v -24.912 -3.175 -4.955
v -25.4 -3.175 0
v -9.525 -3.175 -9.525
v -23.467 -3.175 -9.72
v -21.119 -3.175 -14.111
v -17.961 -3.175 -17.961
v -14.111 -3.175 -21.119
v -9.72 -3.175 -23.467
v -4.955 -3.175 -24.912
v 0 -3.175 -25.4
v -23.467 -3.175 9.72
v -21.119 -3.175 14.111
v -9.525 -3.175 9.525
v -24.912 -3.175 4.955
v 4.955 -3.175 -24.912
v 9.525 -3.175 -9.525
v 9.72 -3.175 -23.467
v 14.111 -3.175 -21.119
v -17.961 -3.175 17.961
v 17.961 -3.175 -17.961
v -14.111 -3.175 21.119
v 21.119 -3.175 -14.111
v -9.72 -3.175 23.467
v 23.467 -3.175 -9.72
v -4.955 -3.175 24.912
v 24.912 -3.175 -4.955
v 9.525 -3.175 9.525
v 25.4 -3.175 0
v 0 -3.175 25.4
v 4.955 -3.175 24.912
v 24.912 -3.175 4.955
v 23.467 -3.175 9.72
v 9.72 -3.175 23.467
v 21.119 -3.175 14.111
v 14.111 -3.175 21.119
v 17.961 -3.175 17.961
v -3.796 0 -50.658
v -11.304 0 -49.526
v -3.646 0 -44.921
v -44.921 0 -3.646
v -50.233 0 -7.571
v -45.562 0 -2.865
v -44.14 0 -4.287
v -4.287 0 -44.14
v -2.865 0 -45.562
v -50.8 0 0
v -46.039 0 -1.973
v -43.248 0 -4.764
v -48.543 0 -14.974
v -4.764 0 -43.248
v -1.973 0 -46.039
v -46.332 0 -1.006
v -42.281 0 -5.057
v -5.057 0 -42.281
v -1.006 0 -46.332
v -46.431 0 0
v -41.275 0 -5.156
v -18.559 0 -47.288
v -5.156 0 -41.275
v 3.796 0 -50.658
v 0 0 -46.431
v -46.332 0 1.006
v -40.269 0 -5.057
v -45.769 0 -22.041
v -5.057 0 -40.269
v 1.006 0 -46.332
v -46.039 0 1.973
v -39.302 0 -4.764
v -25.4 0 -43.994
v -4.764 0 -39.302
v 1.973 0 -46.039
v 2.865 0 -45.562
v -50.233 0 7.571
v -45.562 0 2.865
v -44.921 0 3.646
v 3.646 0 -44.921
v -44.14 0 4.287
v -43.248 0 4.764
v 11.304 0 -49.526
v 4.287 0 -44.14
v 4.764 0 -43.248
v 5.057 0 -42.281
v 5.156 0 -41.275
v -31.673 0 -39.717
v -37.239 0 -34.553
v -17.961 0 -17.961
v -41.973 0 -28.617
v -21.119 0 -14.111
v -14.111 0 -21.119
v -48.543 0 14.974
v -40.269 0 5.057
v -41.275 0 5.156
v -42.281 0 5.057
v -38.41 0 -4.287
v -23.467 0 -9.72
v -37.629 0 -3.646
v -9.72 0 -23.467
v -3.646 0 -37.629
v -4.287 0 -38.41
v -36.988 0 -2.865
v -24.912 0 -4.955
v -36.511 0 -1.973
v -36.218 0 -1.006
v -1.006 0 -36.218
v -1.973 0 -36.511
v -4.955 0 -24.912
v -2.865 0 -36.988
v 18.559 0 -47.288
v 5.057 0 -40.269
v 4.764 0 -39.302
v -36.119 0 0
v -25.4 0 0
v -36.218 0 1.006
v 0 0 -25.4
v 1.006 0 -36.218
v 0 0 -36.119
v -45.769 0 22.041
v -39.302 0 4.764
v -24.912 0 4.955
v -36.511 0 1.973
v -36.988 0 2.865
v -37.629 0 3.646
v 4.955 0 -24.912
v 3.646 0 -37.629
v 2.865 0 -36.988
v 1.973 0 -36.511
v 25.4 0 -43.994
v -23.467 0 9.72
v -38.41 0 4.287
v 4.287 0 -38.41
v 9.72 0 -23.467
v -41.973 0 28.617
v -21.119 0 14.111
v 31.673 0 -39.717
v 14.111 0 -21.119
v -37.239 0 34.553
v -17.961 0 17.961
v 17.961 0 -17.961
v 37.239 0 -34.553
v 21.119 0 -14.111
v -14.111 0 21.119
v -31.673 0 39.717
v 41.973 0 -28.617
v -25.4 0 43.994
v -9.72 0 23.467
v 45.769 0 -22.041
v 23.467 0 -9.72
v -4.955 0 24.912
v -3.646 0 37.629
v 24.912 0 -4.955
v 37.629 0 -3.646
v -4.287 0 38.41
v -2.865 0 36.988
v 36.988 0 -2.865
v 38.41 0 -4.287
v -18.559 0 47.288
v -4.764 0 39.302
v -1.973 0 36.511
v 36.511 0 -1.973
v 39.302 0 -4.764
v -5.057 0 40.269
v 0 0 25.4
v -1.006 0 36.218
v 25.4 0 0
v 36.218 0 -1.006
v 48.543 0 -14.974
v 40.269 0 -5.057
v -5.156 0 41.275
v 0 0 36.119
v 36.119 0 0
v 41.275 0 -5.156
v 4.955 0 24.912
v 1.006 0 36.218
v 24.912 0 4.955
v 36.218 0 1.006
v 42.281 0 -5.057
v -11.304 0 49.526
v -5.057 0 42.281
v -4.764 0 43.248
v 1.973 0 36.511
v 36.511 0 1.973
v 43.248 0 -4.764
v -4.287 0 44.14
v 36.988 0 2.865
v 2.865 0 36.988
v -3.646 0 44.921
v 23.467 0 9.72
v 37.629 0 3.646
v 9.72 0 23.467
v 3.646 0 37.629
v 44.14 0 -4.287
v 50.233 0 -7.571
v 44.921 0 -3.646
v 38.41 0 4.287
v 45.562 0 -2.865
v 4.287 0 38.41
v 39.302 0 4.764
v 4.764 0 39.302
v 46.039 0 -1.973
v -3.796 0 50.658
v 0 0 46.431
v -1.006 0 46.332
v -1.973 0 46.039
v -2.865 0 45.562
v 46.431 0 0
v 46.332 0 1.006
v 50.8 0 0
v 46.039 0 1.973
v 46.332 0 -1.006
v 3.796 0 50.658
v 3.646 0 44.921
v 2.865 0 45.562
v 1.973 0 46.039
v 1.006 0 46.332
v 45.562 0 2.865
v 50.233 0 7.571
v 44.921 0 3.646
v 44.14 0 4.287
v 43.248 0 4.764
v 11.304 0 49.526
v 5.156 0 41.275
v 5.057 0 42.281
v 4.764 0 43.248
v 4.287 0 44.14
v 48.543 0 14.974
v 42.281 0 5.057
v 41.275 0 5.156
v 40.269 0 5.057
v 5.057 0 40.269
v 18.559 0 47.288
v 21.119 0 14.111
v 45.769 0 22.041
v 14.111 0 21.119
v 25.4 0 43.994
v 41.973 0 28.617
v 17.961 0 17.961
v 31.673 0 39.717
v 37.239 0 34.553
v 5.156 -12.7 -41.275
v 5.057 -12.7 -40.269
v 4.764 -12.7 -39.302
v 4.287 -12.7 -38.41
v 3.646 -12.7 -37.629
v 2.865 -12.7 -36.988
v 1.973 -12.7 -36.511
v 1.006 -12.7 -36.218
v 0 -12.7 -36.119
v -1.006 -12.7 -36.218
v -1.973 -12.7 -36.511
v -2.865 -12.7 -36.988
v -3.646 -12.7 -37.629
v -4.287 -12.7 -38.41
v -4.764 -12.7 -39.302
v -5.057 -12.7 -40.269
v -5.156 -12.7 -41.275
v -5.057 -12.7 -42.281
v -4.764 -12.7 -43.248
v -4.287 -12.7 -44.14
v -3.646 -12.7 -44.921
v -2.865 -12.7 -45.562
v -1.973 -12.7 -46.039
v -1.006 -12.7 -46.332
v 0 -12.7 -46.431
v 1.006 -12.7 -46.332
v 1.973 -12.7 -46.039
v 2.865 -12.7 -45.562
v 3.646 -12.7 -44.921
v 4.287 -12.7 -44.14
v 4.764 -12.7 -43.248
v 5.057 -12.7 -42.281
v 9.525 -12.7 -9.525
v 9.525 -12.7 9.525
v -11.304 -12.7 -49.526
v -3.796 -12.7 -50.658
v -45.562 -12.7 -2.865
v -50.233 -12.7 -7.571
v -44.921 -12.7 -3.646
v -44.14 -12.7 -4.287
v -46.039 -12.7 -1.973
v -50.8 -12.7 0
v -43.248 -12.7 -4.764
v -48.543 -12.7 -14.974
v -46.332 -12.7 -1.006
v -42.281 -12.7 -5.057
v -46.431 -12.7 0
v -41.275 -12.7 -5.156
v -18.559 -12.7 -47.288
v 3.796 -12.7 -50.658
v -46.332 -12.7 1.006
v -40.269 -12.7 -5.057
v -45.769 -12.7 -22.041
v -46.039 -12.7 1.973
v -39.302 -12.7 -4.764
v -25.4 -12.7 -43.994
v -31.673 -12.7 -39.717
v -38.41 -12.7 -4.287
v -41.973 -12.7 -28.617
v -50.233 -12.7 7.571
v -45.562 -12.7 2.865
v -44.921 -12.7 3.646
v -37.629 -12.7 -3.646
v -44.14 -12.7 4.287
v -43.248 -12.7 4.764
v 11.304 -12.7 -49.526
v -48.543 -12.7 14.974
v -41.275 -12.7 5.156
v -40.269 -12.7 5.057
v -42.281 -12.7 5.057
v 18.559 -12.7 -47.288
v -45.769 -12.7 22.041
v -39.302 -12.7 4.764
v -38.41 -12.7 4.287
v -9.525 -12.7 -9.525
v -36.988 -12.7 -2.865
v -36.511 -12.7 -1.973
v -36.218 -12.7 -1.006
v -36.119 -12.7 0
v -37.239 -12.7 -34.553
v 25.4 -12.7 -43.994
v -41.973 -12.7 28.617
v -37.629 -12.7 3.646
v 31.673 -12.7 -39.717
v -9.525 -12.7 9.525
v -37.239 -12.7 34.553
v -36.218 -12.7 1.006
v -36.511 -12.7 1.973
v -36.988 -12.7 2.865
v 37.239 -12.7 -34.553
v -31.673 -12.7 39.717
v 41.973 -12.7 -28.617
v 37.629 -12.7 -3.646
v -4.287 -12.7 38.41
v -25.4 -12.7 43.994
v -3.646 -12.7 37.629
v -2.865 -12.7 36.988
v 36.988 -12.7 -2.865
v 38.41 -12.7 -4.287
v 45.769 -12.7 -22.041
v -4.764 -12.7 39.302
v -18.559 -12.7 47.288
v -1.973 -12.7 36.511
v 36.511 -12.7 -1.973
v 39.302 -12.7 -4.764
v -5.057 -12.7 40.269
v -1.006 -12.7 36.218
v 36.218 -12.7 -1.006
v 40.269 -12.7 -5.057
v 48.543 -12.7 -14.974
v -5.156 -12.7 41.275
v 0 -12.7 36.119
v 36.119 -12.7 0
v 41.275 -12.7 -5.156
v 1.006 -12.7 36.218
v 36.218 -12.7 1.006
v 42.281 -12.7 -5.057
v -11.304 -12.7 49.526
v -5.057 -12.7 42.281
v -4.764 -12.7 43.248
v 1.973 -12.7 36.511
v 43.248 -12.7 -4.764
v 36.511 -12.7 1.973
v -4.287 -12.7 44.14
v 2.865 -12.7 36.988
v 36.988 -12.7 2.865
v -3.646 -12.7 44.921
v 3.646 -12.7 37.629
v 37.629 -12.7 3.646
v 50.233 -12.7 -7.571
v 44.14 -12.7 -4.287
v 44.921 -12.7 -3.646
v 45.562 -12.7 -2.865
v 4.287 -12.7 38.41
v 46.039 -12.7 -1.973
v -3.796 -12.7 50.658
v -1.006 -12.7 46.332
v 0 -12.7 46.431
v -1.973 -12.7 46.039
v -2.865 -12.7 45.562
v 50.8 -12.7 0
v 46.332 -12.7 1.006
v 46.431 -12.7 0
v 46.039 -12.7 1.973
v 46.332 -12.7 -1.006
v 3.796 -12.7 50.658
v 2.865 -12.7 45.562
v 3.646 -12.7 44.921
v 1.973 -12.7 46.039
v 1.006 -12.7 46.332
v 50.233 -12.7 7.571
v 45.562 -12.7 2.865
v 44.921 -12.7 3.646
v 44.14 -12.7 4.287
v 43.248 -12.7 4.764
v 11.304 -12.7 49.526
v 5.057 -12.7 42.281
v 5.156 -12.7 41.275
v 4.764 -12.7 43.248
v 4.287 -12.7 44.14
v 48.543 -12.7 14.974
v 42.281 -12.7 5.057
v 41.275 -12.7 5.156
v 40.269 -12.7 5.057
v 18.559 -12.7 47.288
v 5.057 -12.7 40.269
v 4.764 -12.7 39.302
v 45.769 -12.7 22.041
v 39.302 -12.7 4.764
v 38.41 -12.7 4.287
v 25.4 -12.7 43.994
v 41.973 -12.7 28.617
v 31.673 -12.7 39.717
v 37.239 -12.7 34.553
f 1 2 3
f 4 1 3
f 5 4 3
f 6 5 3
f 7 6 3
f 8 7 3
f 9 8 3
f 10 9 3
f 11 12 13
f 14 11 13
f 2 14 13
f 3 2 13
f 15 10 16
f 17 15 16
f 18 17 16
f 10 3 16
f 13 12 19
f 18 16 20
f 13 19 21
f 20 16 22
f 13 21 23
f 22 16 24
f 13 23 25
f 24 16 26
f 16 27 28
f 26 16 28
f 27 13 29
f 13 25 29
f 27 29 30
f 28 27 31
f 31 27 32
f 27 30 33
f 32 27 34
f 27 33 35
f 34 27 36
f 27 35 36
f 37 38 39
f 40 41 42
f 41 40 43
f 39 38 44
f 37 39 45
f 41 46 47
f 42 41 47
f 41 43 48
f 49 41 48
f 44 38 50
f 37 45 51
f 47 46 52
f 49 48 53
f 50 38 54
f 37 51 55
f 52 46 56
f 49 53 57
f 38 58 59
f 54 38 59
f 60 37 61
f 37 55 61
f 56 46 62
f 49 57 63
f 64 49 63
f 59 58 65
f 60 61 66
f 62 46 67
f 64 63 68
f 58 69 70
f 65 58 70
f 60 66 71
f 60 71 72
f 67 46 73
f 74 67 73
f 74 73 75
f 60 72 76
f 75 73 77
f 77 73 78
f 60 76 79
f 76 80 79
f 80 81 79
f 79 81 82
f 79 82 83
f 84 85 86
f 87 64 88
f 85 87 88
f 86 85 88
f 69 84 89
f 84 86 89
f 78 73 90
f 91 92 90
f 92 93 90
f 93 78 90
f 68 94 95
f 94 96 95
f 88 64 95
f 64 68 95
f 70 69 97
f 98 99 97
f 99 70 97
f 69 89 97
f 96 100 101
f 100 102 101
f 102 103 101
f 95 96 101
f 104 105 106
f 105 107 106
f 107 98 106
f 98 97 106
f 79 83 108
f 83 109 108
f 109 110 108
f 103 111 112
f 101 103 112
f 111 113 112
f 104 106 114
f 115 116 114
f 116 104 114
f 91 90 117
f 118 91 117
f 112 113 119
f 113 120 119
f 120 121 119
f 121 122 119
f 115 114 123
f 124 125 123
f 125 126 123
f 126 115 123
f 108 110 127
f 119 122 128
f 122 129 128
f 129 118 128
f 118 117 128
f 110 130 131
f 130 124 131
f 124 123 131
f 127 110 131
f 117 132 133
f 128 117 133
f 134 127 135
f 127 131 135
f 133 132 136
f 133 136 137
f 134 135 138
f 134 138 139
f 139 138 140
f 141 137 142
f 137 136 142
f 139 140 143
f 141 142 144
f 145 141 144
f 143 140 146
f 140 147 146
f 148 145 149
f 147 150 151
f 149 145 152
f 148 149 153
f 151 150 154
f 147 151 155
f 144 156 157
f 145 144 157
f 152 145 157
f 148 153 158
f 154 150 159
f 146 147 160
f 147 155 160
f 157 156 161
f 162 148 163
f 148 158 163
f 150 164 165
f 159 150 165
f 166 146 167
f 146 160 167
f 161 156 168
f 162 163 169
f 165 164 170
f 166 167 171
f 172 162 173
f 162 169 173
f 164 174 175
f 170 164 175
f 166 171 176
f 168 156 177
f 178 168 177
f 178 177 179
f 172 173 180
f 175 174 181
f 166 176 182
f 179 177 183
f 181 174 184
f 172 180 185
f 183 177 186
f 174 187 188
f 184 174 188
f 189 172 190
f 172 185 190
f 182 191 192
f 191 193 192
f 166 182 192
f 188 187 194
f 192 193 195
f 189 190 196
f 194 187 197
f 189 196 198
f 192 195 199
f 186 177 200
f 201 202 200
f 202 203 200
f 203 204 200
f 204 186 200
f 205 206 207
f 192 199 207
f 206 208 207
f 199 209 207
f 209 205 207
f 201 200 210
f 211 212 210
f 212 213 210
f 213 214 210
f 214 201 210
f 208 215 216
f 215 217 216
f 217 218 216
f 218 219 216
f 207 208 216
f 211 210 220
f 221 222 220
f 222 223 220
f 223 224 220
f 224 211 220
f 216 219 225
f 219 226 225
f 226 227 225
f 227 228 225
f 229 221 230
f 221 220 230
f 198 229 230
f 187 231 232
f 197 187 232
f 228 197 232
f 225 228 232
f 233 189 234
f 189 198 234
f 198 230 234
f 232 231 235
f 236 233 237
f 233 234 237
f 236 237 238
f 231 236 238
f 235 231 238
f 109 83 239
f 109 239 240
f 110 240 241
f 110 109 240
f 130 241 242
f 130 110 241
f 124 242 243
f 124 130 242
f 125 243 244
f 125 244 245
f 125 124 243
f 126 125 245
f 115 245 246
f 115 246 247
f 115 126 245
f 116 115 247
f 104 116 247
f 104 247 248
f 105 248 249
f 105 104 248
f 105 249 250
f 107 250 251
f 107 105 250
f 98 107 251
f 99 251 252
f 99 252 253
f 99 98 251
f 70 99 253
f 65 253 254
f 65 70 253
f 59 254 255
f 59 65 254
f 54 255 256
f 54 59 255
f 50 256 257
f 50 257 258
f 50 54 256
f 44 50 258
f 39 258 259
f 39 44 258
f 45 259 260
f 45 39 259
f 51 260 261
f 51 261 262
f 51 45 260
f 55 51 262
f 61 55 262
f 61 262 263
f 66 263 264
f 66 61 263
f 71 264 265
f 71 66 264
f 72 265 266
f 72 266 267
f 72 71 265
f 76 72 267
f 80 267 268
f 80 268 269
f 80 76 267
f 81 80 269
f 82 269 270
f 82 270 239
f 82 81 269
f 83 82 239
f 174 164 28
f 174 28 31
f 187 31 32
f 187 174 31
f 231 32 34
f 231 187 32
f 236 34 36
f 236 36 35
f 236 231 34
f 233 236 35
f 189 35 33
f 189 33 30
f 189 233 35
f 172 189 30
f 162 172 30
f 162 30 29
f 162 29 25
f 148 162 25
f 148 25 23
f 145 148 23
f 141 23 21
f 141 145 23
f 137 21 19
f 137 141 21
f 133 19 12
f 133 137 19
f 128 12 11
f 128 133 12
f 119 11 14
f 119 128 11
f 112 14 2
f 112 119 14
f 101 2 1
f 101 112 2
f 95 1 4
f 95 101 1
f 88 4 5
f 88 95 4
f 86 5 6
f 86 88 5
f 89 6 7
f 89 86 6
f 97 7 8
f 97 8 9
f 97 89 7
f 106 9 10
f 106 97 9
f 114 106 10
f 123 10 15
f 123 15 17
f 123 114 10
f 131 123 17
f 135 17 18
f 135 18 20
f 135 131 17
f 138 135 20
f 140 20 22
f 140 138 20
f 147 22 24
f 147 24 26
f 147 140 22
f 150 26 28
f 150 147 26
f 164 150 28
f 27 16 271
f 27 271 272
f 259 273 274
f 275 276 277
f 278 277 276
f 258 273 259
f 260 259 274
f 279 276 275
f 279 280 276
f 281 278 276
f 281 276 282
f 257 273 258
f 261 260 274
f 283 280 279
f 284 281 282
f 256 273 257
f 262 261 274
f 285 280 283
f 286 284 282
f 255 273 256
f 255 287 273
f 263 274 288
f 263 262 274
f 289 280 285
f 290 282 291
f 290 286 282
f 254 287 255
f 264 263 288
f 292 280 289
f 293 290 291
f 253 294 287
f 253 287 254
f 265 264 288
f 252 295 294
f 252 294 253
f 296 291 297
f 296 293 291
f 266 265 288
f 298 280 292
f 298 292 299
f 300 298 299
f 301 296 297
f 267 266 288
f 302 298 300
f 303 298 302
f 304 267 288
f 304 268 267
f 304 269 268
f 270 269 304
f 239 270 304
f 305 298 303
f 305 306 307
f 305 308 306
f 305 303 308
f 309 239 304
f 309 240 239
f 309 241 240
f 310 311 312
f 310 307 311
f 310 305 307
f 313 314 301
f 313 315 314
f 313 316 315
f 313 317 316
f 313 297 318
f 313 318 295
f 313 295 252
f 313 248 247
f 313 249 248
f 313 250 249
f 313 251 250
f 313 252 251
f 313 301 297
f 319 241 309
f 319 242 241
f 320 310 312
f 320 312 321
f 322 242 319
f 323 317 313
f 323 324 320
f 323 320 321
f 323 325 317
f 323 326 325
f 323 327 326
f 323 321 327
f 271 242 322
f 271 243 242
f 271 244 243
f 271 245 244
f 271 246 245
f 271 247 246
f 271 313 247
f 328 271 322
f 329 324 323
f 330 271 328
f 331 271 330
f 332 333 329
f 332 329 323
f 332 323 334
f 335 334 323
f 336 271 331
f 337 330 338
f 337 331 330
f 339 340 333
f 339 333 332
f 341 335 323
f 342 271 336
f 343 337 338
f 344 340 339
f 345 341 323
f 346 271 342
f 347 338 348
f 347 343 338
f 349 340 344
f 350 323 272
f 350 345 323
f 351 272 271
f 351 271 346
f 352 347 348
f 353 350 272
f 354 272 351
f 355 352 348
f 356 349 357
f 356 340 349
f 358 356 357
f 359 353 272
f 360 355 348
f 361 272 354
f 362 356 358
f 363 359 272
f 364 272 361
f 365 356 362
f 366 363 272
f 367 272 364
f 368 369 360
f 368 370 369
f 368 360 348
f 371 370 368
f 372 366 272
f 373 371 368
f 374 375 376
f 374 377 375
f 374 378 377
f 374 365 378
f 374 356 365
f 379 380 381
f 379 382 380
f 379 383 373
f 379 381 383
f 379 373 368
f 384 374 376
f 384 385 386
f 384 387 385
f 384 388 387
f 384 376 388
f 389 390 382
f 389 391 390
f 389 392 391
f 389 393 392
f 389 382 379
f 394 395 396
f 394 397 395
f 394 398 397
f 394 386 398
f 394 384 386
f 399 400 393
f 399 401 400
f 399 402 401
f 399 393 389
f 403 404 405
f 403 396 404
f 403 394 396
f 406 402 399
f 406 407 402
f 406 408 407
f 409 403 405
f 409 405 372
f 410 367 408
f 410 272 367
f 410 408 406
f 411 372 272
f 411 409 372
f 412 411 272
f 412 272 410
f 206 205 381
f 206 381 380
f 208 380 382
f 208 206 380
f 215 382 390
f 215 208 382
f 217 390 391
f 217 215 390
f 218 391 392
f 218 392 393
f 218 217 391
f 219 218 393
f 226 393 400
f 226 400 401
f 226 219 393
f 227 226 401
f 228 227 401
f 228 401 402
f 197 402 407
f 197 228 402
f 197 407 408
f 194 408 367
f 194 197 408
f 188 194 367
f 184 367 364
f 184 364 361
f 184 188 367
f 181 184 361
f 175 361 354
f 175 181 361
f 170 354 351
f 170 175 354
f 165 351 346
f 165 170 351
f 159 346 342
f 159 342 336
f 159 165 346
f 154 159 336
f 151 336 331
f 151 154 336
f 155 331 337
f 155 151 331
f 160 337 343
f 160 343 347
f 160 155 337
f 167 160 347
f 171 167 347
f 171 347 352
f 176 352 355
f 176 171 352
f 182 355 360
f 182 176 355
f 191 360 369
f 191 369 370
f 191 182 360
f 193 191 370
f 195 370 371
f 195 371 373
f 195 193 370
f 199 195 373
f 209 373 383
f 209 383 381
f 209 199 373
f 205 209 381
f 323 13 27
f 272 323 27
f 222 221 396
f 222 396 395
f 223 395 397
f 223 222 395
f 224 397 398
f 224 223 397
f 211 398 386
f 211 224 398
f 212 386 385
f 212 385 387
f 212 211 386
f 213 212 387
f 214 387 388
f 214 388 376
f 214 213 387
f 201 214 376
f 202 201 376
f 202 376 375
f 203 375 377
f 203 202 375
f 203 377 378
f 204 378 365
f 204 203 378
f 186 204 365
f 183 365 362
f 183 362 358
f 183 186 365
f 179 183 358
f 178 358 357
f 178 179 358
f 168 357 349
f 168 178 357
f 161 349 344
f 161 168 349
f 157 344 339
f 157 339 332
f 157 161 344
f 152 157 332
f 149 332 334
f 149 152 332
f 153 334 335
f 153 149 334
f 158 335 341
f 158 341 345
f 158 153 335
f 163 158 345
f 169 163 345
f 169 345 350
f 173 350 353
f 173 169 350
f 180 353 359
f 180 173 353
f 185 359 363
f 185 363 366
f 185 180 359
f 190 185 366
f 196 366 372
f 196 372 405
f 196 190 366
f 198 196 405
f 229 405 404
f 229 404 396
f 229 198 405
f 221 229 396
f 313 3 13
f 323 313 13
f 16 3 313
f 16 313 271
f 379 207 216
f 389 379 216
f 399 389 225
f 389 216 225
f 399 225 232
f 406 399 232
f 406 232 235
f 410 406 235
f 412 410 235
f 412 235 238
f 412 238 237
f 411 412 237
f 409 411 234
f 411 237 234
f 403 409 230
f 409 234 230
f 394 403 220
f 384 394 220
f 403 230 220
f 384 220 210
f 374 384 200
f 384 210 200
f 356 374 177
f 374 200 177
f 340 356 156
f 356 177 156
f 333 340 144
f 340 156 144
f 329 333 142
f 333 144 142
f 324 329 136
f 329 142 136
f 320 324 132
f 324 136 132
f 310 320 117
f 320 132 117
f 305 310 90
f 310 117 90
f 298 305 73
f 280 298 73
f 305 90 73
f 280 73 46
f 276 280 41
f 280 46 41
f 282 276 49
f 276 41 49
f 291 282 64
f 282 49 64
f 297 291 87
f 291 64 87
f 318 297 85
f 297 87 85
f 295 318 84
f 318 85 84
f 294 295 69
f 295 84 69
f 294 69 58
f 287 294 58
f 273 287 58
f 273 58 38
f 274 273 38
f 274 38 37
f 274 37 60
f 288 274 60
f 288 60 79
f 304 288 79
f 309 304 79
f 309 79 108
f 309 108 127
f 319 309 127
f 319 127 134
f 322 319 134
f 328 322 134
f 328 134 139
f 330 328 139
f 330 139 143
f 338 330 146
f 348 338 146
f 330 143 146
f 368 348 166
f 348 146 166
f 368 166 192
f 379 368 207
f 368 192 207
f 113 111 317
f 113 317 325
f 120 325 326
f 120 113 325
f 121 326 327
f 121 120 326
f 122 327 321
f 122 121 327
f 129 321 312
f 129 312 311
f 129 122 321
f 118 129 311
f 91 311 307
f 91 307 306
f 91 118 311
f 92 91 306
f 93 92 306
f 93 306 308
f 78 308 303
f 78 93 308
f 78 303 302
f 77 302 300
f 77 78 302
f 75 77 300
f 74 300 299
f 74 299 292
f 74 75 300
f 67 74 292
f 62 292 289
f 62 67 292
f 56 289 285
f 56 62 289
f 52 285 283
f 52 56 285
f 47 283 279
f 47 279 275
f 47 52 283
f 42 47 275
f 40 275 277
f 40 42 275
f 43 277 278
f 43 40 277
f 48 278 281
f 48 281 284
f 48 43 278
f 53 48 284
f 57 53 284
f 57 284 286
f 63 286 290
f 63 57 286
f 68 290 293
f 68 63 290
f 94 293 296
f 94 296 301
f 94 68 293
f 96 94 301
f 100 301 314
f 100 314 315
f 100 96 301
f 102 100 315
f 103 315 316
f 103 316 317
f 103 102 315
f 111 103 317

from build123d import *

# Parameters (mm, degrees)
F0_R     = 50.8
F0_R_2   = 5.1562
F0_W     = 19.05
F0_H     = 19.05
F1_DEPTH = 12.7
F2_R     = 25.4
F3_DEPTH = 3.175


with BuildPart() as f1:
    # F0 (on Front) → F1 (new body)
    with BuildSketch(Plane.XZ):
        Circle(F0_R)
        with Locations((0, -41.275)):
            Circle(F0_R_2, mode=Mode.SUBTRACT)
        with Locations((-41.275, 0)):
            Circle(F0_R_2, mode=Mode.SUBTRACT)
        Rectangle(F0_W, F0_H, mode=Mode.SUBTRACT)
        with Locations((41.275, 0)):
            Circle(F0_R_2, mode=Mode.SUBTRACT)
        with Locations((0, 41.275)):
            Circle(F0_R_2, mode=Mode.SUBTRACT)
    extrude(amount=F1_DEPTH)

    # F2 (on Front) → F3 (cut)
    with BuildSketch(Plane.XZ):
        Circle(F2_R)
    extrude(amount=F3_DEPTH, mode=Mode.SUBTRACT)


solid = f1.part
